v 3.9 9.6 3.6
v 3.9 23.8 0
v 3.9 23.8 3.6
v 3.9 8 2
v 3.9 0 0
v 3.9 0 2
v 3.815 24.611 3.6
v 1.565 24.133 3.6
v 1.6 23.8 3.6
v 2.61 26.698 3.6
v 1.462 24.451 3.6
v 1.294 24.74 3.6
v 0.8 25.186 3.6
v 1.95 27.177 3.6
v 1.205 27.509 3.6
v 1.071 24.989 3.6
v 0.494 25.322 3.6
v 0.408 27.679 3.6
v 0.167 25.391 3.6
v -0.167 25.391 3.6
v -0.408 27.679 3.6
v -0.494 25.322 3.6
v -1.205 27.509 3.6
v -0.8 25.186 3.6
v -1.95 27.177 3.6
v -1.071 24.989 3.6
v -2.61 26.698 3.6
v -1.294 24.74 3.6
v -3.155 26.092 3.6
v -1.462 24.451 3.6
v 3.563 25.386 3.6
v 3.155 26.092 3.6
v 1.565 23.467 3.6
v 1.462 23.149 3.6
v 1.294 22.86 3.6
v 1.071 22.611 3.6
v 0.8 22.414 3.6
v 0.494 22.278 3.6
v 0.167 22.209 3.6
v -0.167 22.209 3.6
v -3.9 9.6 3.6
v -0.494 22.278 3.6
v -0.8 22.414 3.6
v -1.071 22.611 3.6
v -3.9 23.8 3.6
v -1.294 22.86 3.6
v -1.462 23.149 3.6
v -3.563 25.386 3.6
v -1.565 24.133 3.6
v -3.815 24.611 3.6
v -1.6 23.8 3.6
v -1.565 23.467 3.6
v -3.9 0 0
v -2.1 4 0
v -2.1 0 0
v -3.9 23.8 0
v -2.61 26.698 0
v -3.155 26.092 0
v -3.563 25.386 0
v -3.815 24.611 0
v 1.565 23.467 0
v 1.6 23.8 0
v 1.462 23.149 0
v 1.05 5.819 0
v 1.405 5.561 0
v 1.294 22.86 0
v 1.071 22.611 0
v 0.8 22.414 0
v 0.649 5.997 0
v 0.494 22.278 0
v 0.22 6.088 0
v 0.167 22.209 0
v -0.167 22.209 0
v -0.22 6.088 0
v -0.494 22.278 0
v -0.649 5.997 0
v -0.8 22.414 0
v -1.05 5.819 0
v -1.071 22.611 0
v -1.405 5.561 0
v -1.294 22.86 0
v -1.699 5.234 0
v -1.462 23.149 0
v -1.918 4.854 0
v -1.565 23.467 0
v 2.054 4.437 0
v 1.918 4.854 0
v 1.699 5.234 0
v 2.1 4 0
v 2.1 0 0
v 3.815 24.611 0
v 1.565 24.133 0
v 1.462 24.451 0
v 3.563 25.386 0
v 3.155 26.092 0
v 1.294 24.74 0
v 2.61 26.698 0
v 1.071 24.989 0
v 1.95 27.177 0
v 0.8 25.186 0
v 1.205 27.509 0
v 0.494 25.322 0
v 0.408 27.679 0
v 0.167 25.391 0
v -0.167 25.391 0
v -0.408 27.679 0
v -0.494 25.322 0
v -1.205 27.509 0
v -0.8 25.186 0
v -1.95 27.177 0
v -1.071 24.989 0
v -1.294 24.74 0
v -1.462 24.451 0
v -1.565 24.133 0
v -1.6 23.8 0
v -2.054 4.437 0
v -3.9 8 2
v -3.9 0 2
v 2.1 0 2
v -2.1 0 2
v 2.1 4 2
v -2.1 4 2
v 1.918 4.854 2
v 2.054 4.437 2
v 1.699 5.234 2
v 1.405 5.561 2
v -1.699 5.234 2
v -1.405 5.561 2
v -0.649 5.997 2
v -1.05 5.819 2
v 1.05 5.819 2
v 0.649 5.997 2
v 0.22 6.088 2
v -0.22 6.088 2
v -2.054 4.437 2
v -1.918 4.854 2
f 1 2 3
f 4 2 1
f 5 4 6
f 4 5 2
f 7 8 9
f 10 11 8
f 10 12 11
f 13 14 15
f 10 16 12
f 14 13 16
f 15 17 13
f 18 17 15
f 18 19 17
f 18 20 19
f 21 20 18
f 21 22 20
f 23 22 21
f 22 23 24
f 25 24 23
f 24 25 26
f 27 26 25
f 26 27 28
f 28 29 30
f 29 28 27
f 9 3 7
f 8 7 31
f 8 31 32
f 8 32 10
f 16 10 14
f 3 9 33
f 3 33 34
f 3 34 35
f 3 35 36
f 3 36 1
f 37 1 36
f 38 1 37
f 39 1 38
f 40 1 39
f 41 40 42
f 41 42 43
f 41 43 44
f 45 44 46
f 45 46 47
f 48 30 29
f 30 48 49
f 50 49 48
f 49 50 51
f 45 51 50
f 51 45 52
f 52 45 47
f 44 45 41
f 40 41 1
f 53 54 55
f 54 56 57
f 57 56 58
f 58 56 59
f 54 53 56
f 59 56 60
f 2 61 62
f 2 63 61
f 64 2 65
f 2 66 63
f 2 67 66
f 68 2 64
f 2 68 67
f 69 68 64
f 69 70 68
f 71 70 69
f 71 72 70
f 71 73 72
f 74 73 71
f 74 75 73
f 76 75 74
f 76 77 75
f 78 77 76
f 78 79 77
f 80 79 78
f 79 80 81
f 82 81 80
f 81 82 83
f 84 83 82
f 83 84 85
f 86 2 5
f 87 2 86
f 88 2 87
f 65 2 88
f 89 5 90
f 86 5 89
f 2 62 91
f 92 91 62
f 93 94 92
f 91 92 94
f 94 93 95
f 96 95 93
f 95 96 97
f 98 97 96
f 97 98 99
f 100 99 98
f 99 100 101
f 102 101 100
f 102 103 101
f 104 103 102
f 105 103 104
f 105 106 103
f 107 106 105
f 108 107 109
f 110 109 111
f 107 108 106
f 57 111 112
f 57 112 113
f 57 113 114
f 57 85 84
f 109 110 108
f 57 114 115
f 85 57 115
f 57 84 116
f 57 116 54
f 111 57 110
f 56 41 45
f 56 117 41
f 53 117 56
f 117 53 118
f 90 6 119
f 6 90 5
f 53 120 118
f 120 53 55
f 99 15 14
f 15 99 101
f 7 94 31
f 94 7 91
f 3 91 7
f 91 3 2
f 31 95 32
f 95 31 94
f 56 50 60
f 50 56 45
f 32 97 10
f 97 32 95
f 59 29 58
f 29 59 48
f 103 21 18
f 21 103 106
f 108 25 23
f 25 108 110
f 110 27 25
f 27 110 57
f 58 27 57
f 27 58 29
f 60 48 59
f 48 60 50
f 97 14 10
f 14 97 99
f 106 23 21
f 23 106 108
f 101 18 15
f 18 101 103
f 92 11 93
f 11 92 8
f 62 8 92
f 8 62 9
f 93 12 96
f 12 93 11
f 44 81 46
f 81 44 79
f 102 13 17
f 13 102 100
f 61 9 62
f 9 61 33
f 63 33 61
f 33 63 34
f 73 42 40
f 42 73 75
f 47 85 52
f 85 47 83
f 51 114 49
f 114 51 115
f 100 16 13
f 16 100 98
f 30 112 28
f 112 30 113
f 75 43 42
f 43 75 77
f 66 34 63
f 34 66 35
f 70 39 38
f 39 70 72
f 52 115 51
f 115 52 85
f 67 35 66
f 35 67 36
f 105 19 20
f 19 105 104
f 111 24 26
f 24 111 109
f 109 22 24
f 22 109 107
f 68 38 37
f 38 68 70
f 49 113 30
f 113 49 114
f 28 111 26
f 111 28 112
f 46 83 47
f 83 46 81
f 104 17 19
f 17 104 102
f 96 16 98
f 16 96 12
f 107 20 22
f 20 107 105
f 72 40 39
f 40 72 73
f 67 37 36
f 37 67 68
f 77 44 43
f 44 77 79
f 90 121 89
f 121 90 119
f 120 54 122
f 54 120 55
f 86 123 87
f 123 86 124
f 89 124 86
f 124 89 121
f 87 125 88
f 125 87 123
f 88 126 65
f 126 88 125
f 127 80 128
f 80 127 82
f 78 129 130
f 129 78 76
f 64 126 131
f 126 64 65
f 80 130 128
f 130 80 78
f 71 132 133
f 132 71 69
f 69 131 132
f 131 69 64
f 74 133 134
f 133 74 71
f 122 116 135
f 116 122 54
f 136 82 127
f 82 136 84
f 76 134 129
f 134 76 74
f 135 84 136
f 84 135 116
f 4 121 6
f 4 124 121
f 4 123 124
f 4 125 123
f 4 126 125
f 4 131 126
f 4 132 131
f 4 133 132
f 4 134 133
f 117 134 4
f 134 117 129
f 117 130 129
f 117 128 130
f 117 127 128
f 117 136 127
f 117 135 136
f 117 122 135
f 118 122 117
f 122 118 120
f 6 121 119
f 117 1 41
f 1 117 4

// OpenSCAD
// ========================================================================================
// Robori Mendel
// Extruder tongue
// GNU GPL v3
// Derived from :
// - RepRapPro Mendel's extruder tongue
//
// Contact : support@robori.com
// Reference : http://www.robori.com/documentation/Mendel
//
// History :
// 23 Jul 2015 - Minor dimensional adjustments
// ========================================================================================

$fn = 30;

extruder_tongue();

module extruder_tongue()
{
	slot_l = 4 + 0.2;
	level_w = 8 - 0.2;

	difference()
	{
		union()
		{
			translate([-level_w/2, 0, 0]) cube([level_w, 23.8, 3.6]);
			translate([0, 23.8, 0]) cylinder(h=3.6, r=level_w/2, center=false);
		}
		// hole
		translate([0, 23.8, -1]) cylinder(h=3.6 + 2, r=1.6, center=false);
		// retainer
		translate([-slot_l/2, -1, -1]) cube([slot_l, 4 + 1, 3.6 + 2]);
		translate([0, 4, -1]) cylinder(h=3.6 + 2, r=slot_l/2, center=false);
		// cut
		translate([-4 - 1, -1, 2]) cube([8 + 2, 8 + 1, 1.6 + 1]);
		translate([-4 - 1, 8, 2]) rotate([-45, 0, 0]) translate([0, -5, 0]) cube([8 + 2, 5, 5]);
	}
}
